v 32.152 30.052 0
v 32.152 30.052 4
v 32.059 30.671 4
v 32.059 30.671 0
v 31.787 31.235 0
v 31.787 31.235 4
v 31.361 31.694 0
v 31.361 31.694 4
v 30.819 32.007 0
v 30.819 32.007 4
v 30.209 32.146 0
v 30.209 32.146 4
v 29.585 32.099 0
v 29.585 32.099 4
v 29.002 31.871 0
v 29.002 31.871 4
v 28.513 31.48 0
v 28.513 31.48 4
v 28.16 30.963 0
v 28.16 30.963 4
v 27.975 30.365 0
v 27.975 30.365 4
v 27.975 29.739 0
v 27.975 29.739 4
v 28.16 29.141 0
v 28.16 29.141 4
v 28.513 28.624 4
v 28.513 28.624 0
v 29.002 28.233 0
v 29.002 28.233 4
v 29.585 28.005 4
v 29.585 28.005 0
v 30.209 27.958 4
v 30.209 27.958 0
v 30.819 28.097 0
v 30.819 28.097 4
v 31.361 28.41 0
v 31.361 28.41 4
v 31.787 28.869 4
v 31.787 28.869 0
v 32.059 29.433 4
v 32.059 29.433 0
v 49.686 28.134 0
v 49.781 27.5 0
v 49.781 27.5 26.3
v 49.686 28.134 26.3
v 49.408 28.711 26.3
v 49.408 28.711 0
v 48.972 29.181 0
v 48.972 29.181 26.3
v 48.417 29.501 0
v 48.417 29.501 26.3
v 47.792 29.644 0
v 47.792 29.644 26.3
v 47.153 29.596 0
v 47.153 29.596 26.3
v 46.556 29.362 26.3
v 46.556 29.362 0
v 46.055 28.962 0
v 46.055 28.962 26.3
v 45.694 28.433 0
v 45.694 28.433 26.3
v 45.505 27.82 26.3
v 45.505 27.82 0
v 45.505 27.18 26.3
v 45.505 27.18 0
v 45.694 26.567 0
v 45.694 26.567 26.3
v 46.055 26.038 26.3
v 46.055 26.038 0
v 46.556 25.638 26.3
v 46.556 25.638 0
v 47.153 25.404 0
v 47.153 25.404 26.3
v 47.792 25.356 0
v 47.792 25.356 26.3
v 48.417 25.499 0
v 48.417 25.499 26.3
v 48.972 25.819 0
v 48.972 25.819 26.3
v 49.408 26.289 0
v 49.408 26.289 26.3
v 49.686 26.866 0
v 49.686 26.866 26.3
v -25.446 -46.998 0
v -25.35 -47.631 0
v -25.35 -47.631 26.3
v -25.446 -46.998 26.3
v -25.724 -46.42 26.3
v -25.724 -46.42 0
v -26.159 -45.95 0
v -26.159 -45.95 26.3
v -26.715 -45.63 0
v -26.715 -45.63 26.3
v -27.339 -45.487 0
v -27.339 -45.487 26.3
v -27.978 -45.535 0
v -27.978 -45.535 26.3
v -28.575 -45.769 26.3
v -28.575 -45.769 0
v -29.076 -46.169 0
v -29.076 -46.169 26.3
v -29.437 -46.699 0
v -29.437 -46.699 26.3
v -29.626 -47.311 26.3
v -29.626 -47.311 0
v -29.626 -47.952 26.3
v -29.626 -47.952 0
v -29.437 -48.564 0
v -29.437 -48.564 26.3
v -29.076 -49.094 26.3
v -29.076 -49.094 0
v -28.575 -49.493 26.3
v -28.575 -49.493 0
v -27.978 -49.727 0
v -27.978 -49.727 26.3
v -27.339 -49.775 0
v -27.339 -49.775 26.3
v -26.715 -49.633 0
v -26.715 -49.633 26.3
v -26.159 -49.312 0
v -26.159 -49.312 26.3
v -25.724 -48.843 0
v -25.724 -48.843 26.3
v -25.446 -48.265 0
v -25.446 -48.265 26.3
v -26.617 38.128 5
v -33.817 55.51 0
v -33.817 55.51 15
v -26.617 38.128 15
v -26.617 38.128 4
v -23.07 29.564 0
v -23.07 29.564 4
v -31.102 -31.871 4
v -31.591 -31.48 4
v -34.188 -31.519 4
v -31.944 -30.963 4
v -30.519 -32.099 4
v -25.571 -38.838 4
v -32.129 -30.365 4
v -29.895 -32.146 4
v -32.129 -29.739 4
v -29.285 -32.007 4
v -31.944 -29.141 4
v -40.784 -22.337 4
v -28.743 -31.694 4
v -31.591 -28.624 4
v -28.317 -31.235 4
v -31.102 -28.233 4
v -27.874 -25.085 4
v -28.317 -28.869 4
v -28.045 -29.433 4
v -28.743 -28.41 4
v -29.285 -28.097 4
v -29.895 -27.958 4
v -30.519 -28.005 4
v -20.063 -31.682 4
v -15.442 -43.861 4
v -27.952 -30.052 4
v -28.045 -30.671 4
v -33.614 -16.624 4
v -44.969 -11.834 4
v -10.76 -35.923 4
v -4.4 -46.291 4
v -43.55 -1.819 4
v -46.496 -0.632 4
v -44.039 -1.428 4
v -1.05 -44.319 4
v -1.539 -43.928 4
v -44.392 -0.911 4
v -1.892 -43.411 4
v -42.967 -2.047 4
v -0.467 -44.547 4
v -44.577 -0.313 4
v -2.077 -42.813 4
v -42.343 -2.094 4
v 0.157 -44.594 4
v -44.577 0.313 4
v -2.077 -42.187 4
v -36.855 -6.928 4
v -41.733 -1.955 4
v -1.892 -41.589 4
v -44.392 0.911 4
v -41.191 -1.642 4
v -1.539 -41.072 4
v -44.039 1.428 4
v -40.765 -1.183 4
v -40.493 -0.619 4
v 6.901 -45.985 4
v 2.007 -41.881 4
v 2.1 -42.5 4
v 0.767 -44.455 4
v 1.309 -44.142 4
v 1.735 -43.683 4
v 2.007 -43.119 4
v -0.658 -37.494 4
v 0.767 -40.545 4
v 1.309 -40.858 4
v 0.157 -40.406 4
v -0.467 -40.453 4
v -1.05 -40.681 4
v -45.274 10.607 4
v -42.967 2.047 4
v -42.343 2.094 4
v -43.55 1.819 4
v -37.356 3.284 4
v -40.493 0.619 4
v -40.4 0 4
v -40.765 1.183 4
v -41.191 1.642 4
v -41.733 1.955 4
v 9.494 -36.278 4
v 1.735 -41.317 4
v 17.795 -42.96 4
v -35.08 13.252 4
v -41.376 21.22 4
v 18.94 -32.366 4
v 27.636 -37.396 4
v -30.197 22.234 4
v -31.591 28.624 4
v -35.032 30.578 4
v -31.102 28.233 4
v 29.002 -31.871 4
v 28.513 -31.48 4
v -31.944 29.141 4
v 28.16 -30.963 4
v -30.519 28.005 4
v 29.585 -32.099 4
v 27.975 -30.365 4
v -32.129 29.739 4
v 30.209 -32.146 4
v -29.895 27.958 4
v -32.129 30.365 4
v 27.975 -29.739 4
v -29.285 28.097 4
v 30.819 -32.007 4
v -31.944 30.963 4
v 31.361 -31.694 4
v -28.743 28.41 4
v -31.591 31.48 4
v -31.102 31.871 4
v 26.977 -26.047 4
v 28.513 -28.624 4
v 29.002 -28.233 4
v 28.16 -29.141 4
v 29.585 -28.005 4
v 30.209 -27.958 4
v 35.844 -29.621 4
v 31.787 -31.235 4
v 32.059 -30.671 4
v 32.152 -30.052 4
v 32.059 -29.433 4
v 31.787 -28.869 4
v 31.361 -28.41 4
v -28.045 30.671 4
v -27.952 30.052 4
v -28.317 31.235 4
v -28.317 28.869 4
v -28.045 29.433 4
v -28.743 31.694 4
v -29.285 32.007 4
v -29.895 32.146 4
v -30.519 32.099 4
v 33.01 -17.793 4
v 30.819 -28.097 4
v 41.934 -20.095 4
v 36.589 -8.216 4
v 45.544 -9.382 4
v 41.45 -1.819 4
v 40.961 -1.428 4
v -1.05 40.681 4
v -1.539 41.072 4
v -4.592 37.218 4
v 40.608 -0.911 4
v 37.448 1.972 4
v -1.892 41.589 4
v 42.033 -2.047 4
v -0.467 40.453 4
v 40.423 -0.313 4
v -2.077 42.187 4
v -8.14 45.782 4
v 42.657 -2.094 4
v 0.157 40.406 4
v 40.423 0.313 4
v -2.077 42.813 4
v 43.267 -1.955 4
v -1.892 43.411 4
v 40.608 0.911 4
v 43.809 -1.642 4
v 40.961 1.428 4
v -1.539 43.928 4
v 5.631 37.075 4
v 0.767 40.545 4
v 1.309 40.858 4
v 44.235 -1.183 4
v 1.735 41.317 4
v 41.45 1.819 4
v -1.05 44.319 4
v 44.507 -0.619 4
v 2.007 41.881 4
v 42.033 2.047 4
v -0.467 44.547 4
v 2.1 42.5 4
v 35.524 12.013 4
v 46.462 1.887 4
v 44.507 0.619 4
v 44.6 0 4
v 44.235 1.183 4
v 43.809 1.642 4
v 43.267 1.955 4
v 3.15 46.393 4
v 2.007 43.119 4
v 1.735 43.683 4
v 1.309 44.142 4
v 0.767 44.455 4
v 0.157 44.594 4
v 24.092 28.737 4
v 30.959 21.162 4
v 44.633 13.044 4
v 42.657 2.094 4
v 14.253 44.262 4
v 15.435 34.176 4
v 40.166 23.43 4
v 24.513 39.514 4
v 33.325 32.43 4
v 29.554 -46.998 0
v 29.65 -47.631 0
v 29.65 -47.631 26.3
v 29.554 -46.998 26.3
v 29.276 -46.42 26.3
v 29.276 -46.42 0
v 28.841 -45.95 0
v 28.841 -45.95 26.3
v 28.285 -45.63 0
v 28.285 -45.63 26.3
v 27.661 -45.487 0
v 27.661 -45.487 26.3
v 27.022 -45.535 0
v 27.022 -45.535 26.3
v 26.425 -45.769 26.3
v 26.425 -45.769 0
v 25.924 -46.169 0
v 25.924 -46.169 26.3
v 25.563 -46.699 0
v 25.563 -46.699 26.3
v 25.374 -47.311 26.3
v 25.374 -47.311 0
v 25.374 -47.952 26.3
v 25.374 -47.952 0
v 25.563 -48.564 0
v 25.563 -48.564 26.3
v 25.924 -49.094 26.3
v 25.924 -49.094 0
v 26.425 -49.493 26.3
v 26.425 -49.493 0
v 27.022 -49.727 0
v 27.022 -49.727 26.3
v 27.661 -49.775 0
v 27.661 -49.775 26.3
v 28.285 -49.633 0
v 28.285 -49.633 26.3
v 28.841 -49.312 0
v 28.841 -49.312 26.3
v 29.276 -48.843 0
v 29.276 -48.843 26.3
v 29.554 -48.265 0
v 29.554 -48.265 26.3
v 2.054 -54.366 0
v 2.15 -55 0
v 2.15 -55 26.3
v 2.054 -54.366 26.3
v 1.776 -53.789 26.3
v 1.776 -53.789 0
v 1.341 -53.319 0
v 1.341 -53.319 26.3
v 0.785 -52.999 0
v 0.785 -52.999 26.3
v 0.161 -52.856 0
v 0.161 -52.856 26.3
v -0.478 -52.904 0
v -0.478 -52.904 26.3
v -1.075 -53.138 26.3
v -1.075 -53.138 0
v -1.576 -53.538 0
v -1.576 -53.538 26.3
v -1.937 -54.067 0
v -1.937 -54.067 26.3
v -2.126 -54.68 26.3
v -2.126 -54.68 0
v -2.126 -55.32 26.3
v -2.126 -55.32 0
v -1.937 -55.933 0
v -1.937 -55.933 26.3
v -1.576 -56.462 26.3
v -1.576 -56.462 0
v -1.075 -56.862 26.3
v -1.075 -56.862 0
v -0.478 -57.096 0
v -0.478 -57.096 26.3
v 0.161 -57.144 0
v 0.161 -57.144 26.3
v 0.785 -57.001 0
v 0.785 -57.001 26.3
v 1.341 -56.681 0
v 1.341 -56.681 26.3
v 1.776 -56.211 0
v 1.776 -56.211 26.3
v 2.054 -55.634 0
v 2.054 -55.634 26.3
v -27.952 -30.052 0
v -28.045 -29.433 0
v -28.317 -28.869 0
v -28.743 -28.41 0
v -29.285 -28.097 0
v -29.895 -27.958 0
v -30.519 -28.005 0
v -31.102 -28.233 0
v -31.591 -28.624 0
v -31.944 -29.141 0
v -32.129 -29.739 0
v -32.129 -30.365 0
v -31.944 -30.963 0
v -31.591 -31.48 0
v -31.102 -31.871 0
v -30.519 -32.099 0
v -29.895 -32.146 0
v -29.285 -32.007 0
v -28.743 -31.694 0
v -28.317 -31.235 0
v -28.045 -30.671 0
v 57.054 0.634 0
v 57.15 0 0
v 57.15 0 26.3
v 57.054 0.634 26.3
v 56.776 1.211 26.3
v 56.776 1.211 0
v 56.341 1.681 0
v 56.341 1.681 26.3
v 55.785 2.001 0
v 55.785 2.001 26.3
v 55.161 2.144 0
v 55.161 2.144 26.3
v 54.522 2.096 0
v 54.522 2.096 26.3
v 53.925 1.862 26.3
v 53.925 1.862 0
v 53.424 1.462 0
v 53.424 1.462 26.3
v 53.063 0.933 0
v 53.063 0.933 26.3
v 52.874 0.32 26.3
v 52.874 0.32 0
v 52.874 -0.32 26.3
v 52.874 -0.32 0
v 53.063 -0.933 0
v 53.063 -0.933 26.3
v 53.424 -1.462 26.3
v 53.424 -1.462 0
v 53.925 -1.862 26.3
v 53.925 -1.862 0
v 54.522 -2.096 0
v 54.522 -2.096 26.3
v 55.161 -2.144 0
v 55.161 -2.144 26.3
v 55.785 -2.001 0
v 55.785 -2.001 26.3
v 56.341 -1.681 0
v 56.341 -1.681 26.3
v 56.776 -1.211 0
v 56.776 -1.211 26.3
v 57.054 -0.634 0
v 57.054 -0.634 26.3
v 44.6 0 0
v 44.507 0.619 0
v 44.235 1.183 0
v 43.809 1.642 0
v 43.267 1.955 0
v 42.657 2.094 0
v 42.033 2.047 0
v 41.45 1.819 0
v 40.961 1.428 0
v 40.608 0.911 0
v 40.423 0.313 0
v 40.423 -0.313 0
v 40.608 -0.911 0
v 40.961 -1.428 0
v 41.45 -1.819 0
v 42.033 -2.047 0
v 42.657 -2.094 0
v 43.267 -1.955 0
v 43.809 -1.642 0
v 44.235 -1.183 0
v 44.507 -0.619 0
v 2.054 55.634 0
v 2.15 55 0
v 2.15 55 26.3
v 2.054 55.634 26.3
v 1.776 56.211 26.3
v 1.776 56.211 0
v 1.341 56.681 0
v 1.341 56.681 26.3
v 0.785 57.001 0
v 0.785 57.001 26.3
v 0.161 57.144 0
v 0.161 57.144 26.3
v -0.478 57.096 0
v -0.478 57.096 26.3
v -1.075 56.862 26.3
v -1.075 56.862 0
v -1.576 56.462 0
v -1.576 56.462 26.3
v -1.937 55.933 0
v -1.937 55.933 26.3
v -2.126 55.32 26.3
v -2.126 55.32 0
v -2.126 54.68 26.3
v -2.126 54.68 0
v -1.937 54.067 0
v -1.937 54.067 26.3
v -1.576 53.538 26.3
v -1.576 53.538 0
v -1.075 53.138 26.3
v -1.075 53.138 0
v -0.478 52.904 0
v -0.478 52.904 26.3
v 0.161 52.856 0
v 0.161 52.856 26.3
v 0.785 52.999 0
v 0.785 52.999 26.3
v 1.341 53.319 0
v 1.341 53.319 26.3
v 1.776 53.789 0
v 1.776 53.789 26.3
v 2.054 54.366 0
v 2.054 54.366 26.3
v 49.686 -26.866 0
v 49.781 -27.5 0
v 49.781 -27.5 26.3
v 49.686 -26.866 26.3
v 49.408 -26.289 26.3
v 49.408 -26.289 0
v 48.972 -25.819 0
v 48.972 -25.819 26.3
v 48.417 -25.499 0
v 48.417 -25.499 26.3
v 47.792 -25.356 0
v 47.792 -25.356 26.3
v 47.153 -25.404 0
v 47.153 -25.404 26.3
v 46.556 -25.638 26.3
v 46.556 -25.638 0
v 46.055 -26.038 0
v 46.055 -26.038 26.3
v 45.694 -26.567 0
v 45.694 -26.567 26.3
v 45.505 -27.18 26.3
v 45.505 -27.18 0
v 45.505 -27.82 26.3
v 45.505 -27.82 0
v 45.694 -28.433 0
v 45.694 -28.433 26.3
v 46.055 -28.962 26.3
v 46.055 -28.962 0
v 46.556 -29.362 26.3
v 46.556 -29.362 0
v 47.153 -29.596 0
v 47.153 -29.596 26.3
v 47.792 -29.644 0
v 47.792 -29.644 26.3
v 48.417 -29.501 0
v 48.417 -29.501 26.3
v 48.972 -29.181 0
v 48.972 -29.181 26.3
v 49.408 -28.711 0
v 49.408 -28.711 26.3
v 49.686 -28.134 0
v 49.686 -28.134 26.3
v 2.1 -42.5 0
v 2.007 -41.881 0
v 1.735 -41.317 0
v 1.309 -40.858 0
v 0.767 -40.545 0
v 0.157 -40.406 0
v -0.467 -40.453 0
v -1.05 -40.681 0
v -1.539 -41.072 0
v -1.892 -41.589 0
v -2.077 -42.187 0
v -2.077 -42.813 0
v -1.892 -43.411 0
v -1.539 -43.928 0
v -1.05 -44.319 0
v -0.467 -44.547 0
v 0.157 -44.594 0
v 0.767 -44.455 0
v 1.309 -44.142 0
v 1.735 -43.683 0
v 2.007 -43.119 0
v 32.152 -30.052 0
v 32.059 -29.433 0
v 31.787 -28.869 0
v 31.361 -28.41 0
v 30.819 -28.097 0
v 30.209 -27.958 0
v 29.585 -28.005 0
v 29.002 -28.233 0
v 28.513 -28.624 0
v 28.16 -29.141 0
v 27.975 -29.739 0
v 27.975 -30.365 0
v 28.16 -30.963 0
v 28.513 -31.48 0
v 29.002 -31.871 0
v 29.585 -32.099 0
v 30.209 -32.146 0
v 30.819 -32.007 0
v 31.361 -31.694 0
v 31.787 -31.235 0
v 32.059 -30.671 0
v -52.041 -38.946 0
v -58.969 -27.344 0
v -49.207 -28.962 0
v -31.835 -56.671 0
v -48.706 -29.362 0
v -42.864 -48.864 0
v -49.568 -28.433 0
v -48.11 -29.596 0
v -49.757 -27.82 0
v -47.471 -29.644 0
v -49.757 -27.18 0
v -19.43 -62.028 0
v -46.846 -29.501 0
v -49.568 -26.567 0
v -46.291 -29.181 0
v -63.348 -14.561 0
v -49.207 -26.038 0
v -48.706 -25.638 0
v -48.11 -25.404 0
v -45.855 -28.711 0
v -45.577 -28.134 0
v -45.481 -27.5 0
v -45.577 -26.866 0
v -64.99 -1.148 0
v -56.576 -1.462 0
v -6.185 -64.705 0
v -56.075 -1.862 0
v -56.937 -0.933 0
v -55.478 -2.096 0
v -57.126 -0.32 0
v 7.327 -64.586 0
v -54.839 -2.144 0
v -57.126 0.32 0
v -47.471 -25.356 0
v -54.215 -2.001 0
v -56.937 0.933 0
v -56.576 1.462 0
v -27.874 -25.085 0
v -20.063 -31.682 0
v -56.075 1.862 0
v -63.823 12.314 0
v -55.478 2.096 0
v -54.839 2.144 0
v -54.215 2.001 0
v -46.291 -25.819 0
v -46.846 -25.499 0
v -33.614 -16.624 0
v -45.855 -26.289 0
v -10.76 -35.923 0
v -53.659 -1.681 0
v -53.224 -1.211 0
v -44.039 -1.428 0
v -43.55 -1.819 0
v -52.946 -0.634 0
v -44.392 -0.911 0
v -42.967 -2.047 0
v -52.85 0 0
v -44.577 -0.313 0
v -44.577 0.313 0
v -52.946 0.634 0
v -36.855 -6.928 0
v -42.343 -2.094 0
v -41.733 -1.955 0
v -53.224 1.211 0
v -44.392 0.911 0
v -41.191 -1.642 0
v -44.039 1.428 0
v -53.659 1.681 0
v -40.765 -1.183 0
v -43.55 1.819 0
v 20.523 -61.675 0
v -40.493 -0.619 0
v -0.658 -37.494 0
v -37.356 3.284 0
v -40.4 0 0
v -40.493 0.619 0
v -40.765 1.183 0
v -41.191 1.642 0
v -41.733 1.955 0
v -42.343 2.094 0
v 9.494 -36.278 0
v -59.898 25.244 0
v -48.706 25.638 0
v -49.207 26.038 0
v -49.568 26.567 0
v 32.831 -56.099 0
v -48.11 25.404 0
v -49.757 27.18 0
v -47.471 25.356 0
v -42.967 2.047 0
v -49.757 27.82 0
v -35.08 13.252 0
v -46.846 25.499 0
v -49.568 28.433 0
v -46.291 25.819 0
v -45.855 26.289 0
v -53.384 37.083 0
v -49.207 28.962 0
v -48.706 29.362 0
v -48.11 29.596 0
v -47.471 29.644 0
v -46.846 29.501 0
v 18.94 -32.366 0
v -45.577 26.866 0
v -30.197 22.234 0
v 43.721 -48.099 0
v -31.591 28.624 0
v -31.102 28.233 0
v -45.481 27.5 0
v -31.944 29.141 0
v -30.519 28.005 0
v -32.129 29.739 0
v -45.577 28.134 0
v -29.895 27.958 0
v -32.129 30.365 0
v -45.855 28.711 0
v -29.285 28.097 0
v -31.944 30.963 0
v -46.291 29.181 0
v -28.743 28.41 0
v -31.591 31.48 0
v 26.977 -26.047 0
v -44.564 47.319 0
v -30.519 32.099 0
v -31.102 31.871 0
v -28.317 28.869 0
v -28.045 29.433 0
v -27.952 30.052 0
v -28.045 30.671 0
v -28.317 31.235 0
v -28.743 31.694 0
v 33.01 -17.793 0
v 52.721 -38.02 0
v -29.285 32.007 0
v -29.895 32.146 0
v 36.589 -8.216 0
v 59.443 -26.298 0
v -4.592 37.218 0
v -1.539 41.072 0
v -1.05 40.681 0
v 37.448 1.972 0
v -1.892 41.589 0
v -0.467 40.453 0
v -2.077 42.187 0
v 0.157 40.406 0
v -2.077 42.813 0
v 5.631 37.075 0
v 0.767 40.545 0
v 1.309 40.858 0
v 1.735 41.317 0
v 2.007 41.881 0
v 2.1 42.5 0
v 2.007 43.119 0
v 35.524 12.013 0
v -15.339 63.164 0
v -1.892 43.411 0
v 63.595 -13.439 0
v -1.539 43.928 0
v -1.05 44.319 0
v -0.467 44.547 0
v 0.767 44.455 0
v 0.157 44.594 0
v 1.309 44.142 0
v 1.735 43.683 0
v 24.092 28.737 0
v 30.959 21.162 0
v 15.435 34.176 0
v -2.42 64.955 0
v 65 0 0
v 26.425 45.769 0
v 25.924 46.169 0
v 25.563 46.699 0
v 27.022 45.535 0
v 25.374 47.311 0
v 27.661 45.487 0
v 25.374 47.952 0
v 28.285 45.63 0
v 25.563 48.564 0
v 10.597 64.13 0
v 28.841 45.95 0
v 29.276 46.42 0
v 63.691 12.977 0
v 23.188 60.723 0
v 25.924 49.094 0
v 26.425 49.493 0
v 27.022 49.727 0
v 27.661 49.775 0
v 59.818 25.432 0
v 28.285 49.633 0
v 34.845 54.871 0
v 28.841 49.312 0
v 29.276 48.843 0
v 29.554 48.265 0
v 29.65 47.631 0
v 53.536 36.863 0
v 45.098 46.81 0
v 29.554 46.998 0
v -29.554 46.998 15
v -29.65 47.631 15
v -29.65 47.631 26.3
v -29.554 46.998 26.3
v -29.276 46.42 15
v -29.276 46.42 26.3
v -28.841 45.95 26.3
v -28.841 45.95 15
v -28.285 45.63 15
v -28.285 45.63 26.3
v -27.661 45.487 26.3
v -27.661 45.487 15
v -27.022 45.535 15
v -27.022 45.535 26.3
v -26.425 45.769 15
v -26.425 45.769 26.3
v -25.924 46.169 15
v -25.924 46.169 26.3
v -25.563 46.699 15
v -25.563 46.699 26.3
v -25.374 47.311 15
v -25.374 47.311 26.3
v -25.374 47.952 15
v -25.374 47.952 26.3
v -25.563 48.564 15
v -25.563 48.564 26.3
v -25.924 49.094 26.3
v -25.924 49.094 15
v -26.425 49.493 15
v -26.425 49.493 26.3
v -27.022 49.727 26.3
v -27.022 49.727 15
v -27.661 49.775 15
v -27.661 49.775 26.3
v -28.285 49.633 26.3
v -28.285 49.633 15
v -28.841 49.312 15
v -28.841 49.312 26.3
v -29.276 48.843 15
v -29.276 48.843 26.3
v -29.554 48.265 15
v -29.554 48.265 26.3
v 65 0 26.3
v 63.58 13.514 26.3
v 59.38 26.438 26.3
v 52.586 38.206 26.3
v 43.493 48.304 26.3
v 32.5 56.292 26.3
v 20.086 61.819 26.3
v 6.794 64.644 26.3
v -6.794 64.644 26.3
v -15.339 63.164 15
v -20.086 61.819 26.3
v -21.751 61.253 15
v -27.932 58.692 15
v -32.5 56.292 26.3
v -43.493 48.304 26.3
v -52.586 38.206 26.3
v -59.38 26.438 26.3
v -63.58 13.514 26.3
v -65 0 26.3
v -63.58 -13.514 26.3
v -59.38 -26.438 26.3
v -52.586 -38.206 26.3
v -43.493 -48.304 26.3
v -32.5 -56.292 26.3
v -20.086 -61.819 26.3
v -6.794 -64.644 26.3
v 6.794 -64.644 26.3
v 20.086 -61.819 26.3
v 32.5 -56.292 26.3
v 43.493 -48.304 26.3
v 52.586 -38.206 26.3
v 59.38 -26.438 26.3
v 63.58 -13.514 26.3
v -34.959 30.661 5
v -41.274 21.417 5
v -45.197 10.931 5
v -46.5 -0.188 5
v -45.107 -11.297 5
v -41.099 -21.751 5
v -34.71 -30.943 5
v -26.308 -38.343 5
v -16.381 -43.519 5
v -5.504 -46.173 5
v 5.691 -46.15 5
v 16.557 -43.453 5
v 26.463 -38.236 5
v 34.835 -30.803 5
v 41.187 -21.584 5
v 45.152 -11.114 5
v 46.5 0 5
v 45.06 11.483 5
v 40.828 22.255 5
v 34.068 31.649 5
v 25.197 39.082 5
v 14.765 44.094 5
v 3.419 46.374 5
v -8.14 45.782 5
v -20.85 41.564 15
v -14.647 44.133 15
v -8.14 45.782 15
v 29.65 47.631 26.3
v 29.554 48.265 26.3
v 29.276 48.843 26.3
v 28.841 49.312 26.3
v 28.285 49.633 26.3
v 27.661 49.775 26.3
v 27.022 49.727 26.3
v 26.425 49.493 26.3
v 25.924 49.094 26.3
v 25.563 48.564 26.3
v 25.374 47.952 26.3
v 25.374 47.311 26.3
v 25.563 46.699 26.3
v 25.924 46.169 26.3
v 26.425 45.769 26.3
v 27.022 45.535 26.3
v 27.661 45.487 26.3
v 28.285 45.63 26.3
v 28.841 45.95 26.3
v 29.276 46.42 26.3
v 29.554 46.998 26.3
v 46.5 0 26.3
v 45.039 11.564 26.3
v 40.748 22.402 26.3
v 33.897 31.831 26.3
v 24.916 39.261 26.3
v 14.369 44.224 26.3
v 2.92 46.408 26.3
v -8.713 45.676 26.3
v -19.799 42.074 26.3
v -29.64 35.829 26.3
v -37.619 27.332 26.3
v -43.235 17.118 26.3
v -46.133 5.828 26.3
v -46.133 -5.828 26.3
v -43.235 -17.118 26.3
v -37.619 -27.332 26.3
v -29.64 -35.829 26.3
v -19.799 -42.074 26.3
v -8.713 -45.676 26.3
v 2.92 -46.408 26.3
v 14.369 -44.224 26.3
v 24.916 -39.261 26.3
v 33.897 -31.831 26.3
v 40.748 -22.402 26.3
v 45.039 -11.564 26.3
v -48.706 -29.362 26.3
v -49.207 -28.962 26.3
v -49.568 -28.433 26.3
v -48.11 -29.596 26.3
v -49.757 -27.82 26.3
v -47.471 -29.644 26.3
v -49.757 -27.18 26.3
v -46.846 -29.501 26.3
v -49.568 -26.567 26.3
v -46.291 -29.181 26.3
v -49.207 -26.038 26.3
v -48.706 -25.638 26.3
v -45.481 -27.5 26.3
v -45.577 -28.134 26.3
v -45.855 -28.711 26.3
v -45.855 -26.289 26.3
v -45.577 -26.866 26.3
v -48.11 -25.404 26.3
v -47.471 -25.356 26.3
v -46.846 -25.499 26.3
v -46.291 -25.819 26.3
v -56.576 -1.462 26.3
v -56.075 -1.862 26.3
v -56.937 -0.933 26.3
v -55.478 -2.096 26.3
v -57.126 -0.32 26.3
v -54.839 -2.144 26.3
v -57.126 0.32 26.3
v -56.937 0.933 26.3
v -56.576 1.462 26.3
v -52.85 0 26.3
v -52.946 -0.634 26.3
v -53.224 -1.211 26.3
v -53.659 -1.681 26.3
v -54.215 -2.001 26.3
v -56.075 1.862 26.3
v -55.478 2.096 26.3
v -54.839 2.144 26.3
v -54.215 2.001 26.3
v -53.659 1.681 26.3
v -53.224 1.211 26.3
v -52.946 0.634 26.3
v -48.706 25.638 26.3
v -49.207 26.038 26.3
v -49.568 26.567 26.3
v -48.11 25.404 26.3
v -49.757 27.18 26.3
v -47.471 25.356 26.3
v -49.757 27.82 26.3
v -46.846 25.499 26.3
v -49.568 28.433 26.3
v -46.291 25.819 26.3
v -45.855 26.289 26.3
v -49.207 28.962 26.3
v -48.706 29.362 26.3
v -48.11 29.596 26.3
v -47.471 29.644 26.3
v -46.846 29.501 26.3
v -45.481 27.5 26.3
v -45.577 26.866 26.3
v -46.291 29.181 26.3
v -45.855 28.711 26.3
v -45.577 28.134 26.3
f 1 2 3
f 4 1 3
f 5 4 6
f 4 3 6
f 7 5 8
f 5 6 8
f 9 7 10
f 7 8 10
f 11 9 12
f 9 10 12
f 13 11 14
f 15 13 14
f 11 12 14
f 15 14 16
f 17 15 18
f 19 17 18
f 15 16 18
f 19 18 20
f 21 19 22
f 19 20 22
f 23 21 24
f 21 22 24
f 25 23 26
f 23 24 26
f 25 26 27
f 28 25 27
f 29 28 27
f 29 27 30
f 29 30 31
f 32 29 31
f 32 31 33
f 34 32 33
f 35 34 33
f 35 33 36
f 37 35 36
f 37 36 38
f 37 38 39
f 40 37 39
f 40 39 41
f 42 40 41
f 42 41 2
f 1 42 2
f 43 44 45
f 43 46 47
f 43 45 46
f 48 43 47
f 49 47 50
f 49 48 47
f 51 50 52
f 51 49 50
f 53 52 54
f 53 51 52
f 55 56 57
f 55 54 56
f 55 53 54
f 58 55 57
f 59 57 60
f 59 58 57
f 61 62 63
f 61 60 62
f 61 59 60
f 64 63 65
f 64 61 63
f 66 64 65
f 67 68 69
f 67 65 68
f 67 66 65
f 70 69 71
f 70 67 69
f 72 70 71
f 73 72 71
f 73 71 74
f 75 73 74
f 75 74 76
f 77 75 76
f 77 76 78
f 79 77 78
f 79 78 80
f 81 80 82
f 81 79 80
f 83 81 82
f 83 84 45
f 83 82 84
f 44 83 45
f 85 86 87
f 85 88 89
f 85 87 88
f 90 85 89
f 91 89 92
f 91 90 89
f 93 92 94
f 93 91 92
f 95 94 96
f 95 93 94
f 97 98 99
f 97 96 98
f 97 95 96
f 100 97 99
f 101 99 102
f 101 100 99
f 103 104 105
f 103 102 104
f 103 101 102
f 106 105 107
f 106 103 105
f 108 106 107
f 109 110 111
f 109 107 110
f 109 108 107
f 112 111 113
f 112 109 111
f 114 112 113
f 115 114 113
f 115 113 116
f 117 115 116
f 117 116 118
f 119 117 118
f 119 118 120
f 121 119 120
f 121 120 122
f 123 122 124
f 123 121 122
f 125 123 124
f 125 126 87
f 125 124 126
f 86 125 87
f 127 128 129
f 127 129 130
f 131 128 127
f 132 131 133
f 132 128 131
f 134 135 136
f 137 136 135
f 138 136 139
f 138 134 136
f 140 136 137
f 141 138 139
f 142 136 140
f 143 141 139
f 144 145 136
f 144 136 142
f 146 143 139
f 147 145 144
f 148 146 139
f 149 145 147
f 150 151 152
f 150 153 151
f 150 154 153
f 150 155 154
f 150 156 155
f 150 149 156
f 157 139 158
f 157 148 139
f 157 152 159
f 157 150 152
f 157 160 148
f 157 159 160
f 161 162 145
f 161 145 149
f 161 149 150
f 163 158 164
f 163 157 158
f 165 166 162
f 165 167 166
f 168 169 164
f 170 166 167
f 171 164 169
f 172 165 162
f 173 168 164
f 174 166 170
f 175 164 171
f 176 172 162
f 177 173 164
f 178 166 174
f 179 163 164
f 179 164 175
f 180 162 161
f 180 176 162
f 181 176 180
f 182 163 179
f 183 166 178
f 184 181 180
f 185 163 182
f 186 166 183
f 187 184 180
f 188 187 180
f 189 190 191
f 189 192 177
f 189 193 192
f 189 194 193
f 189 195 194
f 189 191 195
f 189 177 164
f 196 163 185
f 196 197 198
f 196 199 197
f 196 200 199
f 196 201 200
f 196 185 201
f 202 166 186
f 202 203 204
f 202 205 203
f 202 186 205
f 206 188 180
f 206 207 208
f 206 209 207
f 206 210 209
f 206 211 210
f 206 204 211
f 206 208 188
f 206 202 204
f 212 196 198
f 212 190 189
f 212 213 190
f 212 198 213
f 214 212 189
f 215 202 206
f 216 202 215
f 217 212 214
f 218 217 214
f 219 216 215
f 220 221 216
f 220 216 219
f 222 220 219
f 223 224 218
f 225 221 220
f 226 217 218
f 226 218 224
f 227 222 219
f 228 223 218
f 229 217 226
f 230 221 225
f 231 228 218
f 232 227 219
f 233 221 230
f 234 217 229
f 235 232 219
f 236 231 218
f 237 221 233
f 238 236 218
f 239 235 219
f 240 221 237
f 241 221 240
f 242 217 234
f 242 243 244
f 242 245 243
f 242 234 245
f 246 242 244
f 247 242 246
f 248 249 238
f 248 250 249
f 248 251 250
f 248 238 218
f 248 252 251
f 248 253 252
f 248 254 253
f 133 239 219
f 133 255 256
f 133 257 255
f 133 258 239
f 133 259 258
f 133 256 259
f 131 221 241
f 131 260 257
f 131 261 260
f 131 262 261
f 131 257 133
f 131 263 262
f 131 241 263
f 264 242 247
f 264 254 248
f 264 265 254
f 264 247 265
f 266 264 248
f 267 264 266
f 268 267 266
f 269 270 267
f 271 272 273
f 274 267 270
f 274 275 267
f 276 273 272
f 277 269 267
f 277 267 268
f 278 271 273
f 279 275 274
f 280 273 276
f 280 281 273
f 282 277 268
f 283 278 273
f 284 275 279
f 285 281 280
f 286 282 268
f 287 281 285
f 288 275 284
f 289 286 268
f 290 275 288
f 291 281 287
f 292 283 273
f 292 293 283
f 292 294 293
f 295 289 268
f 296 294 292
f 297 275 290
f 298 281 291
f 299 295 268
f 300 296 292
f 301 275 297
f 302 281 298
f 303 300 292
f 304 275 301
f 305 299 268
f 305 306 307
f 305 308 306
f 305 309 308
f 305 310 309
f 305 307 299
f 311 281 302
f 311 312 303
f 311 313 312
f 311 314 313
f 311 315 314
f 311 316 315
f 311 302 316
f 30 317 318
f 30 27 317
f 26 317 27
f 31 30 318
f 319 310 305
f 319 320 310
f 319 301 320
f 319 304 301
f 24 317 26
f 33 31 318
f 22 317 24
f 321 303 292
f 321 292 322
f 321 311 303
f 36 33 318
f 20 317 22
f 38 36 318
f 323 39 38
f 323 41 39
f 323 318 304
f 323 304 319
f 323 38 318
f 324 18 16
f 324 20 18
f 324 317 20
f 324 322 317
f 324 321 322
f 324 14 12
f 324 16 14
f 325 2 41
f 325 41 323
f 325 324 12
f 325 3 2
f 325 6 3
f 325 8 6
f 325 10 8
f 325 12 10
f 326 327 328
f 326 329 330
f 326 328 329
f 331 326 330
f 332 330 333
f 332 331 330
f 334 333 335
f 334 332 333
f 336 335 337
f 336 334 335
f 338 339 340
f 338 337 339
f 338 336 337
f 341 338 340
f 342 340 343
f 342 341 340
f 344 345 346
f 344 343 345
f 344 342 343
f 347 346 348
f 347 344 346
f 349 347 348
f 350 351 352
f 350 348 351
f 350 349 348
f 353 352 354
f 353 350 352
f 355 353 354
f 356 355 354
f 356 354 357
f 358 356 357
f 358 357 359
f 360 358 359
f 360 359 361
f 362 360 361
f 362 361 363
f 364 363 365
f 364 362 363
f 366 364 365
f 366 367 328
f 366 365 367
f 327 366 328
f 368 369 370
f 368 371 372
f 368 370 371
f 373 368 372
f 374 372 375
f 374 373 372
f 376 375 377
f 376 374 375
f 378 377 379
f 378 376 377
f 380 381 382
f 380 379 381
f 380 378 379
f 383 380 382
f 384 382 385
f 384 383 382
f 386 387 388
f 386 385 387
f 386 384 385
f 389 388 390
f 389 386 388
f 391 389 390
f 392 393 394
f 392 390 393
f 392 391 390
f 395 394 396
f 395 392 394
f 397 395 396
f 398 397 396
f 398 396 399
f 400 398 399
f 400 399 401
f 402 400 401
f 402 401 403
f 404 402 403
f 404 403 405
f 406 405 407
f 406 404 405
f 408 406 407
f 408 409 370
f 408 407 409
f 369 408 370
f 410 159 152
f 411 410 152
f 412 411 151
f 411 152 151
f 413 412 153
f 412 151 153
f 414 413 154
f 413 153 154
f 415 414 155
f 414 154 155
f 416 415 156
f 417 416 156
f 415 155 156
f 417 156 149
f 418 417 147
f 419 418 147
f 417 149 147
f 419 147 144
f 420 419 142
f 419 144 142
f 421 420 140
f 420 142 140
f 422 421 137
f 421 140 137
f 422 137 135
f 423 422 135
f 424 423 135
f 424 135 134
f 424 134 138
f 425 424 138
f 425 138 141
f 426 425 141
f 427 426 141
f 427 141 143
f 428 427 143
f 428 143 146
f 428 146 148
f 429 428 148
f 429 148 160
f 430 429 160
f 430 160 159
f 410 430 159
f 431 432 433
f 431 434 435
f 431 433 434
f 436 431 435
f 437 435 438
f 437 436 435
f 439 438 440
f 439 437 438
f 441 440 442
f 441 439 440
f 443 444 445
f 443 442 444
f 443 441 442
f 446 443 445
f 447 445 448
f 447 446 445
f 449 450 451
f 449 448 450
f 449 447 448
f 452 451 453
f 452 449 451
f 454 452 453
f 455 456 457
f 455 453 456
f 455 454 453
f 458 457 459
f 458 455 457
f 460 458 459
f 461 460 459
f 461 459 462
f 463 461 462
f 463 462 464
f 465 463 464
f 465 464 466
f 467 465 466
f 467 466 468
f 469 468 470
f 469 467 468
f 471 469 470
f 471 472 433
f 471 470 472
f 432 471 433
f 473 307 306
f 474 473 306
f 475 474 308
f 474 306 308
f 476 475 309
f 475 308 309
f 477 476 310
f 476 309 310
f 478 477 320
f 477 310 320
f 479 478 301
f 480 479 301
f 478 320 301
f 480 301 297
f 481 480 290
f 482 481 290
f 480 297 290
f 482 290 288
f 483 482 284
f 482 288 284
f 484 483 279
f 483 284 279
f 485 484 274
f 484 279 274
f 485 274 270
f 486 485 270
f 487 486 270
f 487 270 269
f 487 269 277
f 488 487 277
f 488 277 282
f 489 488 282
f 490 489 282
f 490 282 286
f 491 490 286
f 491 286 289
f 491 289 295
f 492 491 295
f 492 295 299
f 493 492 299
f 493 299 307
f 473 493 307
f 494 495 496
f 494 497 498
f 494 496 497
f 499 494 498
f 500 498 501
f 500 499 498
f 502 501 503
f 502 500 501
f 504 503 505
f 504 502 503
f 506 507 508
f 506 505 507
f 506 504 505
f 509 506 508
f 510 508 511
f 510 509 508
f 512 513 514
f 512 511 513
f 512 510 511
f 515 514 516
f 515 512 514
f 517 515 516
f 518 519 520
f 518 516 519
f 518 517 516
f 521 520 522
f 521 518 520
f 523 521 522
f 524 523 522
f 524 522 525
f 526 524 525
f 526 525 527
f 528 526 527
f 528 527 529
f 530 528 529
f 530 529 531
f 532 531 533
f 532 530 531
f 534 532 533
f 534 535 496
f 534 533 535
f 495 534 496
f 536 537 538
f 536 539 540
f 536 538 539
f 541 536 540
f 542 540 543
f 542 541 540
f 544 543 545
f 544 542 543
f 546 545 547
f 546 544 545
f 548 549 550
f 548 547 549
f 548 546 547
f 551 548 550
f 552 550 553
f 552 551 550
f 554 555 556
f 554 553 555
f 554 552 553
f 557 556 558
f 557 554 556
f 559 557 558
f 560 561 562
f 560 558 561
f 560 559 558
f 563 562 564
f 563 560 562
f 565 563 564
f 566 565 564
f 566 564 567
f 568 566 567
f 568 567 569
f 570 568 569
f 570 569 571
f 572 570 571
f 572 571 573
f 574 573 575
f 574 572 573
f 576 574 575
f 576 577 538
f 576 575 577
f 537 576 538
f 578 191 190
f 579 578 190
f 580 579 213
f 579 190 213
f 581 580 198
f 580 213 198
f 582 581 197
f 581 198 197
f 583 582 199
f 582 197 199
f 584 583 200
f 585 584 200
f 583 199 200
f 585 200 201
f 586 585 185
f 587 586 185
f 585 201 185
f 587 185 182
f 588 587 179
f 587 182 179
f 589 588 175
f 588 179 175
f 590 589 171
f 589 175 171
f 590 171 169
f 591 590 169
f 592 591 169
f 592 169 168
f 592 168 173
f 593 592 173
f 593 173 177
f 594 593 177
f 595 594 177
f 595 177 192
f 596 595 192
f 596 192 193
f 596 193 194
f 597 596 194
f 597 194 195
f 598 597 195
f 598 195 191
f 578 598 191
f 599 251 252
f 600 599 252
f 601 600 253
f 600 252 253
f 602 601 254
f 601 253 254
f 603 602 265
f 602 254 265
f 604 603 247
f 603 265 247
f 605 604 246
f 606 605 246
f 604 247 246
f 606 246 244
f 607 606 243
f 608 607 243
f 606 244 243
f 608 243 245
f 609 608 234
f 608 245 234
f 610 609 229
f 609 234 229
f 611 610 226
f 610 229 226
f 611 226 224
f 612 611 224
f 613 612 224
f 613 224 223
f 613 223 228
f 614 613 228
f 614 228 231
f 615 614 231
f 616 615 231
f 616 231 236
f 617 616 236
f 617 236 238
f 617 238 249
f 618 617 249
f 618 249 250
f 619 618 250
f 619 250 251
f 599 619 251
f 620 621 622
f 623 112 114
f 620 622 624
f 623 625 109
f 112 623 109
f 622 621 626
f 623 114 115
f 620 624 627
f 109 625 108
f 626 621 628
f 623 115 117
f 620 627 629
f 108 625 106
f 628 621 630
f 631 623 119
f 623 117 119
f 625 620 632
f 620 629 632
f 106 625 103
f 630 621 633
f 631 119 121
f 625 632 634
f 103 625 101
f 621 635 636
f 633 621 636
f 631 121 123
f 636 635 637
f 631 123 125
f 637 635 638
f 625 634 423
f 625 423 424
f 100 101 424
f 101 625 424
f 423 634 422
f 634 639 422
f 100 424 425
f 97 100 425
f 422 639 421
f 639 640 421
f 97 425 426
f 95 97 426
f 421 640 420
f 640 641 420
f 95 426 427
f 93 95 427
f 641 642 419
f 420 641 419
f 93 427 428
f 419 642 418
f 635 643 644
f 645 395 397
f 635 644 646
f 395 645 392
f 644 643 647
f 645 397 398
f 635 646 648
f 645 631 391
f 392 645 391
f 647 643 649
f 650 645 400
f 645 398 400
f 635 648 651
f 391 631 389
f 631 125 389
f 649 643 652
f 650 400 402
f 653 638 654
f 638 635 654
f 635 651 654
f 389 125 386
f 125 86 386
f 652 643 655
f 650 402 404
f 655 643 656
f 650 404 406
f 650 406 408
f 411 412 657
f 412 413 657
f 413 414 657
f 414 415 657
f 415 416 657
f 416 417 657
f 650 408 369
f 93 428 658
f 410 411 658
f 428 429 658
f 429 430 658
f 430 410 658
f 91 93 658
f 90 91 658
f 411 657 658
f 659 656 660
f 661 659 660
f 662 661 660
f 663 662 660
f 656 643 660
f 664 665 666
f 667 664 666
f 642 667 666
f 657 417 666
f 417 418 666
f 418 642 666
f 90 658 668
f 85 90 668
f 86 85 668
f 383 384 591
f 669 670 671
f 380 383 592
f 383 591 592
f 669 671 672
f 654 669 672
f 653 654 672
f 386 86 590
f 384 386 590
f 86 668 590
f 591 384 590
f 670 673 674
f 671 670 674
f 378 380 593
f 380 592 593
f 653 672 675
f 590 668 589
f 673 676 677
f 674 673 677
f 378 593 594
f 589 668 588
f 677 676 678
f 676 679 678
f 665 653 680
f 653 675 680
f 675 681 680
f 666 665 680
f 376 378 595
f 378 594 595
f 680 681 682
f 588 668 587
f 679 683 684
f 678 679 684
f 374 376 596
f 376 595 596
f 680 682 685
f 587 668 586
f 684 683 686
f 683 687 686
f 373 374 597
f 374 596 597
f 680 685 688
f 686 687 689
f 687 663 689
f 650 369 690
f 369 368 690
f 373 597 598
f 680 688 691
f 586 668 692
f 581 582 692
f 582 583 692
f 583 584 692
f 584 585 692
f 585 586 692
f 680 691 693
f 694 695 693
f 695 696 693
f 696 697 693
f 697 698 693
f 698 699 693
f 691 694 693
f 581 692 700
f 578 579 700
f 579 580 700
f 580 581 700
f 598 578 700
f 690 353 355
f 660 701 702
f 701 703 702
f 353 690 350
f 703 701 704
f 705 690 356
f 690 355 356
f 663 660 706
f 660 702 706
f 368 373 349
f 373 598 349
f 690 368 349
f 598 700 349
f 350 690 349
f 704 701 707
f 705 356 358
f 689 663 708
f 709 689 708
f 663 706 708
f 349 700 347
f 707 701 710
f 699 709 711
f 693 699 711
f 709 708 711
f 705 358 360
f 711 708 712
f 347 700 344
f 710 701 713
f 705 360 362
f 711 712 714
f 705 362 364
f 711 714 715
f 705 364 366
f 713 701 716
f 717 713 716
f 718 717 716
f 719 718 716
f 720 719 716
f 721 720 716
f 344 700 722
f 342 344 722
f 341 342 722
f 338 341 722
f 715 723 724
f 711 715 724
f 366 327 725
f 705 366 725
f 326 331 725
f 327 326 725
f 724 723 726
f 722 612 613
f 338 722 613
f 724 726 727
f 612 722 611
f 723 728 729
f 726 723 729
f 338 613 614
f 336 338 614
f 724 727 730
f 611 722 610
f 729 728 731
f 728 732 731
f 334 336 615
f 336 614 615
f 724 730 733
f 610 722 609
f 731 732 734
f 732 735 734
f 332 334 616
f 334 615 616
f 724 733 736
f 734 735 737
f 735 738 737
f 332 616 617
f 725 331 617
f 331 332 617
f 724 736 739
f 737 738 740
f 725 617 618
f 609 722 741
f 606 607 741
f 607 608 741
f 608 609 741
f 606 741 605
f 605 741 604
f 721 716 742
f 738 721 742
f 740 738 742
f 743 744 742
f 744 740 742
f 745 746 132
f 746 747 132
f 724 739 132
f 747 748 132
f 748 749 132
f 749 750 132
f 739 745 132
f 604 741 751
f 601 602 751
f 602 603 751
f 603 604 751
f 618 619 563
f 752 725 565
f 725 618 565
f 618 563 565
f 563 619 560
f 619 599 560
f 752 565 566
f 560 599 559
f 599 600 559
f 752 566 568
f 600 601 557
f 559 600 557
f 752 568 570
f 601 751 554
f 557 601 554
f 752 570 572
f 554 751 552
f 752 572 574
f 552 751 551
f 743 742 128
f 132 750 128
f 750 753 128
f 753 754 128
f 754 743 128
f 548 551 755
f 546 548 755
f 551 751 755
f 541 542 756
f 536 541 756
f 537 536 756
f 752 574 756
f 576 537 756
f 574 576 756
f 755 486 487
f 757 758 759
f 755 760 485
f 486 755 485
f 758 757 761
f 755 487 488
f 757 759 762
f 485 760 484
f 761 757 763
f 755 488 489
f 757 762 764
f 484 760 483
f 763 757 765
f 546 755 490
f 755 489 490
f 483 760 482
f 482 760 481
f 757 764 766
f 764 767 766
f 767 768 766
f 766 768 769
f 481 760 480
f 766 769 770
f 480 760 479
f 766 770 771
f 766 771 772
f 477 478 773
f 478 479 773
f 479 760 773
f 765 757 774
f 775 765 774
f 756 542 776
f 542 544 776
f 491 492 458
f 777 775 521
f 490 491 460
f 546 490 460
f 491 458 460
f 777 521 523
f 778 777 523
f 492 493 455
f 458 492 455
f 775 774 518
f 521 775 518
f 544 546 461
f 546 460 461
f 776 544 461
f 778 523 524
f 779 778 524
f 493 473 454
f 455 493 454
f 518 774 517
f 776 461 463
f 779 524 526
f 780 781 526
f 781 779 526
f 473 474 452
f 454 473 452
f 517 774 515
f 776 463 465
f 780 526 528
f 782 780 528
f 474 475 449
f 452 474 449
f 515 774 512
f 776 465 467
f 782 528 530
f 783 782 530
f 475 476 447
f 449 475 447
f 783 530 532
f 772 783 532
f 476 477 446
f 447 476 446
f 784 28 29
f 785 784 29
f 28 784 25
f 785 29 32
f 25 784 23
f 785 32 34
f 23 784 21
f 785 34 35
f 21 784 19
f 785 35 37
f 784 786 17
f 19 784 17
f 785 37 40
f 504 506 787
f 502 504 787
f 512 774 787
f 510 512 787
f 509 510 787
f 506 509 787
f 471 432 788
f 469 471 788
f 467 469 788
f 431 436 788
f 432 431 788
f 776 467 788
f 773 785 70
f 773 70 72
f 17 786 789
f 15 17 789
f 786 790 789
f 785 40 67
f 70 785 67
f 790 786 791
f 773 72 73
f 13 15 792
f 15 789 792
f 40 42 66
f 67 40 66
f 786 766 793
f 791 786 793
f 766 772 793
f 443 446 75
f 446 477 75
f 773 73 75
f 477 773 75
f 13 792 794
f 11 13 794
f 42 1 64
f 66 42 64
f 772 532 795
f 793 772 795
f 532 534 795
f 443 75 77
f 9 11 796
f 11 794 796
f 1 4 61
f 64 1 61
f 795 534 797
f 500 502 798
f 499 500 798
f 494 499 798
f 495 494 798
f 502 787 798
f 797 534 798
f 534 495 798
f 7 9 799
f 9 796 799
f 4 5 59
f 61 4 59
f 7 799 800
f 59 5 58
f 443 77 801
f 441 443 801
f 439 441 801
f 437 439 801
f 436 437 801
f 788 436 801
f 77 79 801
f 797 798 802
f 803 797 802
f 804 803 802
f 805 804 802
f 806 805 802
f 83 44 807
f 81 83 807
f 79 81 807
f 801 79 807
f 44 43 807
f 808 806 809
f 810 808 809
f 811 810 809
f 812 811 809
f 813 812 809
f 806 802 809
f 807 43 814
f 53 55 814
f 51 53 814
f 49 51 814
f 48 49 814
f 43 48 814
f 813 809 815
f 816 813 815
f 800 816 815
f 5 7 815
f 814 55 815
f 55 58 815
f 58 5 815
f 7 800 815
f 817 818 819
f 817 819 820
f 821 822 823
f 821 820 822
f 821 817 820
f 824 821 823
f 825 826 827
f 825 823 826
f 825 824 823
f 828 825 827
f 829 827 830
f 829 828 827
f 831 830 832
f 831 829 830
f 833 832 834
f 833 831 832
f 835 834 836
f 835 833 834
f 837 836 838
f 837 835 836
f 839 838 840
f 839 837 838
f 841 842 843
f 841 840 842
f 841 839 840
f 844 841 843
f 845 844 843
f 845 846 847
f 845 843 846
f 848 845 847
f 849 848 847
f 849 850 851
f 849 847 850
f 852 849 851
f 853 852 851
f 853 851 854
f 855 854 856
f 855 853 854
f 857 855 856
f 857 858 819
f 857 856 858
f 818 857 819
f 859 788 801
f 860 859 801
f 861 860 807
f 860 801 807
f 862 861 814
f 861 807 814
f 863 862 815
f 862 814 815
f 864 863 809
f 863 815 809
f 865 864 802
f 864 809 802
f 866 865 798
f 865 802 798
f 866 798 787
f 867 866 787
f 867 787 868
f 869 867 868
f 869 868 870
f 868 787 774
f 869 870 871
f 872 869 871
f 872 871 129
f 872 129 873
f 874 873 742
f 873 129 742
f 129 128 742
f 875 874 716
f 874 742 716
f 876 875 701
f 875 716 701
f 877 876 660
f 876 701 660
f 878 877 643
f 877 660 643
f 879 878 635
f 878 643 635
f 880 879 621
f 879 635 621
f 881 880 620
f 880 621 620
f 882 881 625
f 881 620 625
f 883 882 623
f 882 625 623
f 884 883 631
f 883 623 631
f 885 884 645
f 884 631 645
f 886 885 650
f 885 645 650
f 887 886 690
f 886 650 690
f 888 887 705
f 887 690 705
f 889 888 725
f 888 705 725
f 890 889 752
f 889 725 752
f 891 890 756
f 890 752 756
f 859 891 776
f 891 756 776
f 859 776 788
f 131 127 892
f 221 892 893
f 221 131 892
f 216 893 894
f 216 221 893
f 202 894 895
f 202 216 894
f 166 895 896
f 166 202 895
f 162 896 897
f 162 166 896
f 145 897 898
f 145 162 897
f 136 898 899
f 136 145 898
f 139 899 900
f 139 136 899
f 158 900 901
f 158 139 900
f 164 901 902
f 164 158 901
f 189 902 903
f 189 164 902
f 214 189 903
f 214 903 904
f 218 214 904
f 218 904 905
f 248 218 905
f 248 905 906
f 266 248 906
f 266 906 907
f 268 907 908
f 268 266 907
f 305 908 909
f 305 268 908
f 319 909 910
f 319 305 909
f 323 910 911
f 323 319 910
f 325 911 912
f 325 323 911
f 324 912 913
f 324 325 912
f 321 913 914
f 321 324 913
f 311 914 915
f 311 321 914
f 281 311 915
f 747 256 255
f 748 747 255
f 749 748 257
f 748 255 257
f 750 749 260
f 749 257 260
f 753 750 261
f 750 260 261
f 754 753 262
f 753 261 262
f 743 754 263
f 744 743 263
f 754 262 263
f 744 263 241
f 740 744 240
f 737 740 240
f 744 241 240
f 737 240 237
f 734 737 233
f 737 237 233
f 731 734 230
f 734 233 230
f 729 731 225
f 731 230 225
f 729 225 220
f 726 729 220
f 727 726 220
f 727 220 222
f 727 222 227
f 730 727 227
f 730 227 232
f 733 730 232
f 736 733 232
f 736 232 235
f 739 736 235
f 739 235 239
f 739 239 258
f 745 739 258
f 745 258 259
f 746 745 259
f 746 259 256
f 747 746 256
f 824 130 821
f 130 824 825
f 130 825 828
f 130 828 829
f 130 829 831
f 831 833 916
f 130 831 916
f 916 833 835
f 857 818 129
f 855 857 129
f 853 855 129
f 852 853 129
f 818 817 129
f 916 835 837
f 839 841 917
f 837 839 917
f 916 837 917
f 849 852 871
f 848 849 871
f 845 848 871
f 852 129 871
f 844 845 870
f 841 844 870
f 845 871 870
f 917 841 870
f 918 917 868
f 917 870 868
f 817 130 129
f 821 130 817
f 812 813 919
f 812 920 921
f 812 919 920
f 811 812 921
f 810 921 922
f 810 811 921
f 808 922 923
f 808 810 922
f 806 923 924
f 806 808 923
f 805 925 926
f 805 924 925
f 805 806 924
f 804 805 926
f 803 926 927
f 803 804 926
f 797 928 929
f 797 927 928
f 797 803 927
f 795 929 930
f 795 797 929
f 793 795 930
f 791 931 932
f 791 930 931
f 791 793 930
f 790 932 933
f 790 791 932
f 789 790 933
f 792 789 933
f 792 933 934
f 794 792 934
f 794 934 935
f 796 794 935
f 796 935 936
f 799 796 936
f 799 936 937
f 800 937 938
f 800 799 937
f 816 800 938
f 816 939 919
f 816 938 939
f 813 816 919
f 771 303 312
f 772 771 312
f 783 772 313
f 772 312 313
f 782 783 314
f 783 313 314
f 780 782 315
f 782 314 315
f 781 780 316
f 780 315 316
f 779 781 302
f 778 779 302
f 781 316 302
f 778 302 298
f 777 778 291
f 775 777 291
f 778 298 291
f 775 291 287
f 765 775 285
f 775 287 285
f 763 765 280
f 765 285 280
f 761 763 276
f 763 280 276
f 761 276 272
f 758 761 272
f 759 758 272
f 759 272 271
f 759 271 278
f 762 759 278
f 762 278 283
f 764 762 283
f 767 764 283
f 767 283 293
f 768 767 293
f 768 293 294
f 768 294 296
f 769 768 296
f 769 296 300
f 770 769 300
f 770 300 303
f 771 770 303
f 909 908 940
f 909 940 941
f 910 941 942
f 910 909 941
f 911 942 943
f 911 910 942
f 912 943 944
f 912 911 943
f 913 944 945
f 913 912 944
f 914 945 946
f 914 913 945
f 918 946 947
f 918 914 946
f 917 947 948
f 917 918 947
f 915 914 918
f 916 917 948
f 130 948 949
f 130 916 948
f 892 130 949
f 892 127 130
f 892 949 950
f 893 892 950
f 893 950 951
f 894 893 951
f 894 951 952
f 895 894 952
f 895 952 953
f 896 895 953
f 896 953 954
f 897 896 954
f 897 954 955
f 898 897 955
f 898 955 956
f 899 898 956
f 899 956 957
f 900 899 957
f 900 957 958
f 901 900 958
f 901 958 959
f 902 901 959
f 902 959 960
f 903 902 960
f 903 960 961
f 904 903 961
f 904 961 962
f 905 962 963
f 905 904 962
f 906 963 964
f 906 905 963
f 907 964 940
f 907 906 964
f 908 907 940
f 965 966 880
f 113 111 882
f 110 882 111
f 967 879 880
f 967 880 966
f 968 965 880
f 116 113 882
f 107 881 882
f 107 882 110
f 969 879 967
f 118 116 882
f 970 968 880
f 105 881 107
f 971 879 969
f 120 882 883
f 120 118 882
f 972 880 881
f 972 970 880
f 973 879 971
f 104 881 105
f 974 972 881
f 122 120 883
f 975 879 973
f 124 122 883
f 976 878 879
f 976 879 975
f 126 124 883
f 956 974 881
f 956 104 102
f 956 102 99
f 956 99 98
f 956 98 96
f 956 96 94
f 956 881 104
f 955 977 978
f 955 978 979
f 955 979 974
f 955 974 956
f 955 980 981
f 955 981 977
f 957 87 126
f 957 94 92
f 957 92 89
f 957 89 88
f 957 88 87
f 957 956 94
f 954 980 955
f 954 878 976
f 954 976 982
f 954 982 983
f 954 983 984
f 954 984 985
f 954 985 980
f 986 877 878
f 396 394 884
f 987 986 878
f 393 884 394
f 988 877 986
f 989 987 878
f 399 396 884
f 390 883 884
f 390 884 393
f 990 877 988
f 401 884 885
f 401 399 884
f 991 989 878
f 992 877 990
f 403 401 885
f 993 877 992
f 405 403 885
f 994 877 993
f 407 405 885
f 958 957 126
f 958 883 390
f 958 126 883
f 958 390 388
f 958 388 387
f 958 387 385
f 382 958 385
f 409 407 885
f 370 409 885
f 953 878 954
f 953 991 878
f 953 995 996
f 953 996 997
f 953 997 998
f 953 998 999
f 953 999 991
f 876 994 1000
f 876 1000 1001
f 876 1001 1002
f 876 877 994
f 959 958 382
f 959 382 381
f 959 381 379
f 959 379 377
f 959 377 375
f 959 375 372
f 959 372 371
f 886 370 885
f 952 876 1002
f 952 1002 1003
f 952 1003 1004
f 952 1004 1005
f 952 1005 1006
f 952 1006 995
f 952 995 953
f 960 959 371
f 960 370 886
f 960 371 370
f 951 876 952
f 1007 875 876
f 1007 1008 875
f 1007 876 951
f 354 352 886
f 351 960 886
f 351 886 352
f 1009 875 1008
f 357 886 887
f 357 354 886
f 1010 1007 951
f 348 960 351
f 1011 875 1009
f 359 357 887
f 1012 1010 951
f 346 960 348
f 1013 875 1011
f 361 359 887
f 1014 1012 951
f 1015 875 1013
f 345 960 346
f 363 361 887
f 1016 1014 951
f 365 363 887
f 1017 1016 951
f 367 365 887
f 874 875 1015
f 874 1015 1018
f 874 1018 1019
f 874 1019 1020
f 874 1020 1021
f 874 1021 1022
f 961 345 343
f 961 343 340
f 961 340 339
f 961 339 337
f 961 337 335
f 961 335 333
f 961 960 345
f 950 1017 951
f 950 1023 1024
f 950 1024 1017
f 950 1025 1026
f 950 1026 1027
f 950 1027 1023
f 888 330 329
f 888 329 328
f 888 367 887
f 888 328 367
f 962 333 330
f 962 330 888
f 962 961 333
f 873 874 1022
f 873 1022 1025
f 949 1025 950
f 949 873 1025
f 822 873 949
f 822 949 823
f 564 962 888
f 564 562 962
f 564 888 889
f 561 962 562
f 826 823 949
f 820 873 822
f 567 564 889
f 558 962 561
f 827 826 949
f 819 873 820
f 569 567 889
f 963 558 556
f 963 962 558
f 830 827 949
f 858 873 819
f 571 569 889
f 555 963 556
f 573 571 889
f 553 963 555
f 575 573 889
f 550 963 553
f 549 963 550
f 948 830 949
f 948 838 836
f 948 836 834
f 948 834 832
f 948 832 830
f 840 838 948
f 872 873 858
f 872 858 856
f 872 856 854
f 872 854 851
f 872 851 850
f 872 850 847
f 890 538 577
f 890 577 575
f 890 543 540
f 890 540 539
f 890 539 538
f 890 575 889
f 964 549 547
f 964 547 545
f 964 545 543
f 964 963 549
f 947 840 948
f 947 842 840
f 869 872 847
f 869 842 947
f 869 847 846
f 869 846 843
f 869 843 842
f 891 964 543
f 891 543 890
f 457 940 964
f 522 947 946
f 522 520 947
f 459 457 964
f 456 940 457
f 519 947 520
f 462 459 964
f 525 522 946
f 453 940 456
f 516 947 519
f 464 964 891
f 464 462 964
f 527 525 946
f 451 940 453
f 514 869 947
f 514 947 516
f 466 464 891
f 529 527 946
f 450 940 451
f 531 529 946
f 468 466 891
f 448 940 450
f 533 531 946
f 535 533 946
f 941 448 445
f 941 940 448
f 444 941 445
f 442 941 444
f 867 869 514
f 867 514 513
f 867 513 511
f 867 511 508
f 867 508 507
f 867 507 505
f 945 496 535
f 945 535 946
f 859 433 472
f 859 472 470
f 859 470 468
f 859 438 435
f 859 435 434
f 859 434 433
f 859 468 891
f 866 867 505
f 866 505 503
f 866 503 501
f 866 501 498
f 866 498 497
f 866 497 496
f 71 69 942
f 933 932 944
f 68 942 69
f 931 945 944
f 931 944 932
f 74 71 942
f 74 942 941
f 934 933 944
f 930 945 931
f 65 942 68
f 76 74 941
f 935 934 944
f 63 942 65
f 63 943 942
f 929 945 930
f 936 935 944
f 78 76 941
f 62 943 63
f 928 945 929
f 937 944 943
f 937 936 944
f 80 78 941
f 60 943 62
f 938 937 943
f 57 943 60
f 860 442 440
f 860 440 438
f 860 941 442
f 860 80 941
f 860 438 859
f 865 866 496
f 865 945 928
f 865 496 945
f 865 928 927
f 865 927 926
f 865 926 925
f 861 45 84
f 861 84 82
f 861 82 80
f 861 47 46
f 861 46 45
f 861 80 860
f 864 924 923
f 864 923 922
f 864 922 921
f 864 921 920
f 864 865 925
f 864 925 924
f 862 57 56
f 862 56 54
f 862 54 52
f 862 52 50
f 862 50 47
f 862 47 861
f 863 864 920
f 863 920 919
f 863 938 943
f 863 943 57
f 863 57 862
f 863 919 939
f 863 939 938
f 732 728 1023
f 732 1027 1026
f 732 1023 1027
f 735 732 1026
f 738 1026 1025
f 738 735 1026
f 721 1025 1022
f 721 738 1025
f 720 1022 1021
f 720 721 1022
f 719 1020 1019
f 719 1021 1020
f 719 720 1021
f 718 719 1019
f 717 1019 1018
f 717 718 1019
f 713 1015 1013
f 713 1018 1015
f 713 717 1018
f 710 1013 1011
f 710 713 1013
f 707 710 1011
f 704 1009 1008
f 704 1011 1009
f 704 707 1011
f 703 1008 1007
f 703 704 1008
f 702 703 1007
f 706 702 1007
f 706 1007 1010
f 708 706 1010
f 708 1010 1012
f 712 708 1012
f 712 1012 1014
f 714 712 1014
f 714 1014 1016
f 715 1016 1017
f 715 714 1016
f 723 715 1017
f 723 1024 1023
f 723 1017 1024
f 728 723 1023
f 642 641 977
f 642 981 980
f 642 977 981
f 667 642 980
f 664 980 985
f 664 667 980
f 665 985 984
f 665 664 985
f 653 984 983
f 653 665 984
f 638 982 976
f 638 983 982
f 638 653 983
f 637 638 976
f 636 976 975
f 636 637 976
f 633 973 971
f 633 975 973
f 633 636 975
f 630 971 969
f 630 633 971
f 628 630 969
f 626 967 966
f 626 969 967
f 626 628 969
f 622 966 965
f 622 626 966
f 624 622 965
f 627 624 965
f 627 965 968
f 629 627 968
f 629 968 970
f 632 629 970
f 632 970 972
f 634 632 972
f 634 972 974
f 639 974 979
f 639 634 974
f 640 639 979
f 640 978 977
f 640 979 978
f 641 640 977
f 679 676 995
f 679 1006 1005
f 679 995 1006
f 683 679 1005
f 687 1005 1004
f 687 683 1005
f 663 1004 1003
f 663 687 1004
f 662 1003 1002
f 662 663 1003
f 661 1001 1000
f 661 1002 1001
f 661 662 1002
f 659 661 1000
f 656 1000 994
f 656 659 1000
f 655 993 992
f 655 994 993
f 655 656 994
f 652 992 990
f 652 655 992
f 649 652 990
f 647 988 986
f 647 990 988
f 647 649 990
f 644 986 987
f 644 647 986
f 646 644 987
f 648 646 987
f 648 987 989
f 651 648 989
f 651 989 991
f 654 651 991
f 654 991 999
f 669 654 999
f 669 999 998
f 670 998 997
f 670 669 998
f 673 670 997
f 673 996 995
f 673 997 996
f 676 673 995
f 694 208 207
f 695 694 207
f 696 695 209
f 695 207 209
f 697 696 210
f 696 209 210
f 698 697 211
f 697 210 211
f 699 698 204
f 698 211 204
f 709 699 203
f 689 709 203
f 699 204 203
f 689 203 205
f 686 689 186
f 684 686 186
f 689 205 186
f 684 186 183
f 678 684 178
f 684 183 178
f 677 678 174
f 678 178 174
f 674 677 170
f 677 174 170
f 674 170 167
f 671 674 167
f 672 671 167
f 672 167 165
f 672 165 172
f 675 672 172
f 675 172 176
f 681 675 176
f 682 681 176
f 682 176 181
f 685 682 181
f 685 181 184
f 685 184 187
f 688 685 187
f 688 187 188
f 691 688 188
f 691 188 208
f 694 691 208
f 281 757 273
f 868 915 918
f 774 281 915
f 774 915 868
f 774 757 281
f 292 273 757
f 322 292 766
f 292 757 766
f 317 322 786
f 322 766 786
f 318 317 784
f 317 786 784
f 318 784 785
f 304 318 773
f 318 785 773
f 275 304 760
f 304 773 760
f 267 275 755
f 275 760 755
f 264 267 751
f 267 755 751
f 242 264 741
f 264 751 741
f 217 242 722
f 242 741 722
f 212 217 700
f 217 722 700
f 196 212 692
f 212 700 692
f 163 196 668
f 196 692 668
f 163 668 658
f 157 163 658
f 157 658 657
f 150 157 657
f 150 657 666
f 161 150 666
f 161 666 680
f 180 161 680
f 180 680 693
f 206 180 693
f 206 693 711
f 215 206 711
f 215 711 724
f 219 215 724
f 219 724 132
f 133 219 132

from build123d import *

# Parameters (mm, degrees)
SKETCH_1_R               = 65
EXTRUDE_1_DEPTH          = 5
SKETCH_2_R               = 65
SKETCH_2_R_2             = 46.5
EXTRUDE_2_DEPTH          = 21.3
SKETCH_3_R               = 2.1
CUT_EXTRUDE_1_DEPTH      = 21.3
SKETCH_4_R               = 37.5
CUT_EXTRUDE_2_DEPTH      = 21.3
CUT_EXTRUDE_3_DEPTH      = 15
CUT_EXTRUDE_4_DEPTH      = 95.359366255
CUT_EXTRUDE_4_DEPTH_BACK = 95.359366255
SKETCH_6_R               = 2.15
CUT_EXTRUDE_START        = -1
CUT_EXTRUDE_5_DEPTH      = 1


with BuildPart() as part:
    # 草图1 → 凸台-拉伸1 (new body)
    with BuildSketch(Plane.XY):
        Circle(SKETCH_1_R)
    extrude(amount=EXTRUDE_1_DEPTH)

    # 草图2 → 凸台-拉伸2 (add)
    with BuildSketch(Plane.XY.offset(5)):
        Circle(SKETCH_2_R)
        Circle(SKETCH_2_R_2, mode=Mode.SUBTRACT)
    extrude(amount=EXTRUDE_2_DEPTH)

    # 草图3 → 切除-拉伸1 (cut)
    with BuildSketch(Plane.XY.offset(5)):
        with Locations((0, 42.5)):
            Circle(SKETCH_3_R)
        with Locations((30.0520382, 30.0520382)):
            Circle(SKETCH_3_R)
        with Locations((42.5, 0)):
            Circle(SKETCH_3_R)
        with Locations((30.0520382, -30.0520382)):
            Circle(SKETCH_3_R)
        with Locations((0, -42.5)):
            Circle(SKETCH_3_R)
        with Locations((-30.0520382, -30.0520382)):
            Circle(SKETCH_3_R)
        with Locations((-42.5, 0)):
            Circle(SKETCH_3_R)
        with Locations((-30.0520382, 30.0520382)):
            Circle(SKETCH_3_R)
    extrude(amount=-CUT_EXTRUDE_1_DEPTH, mode=Mode.SUBTRACT)

    # 草图4 → 切除-拉伸2 (cut)
    with BuildSketch(Plane(origin=(0, 0, 0), x_dir=(-1, 0, 0), z_dir=(0, 0, -1))):
        Circle(SKETCH_4_R)
    extrude(amount=-CUT_EXTRUDE_2_DEPTH, mode=Mode.SUBTRACT)

    # 草图5 → 切除-拉伸3 (cut)
    with BuildSketch(Plane(origin=(0, 0, 0), x_dir=(-1, 0, 0), z_dir=(0, 0, -1))):
        Polygon((34.449558984, 57.03733322), (19.236184468, 20.308998132), (0.758593817, 27.96266678), (15.971968334, 64.691001868), align=None)
    extrude(amount=-CUT_EXTRUDE_3_DEPTH, mode=Mode.SUBTRACT)

    # 草图6 → 切除-拉伸4 (cut, two sides: drawn at the far end of the back side and taken through both)
    with BuildSketch(Plane.XY.offset(5).offset(-CUT_EXTRUDE_4_DEPTH_BACK)):
        with Locations((0, 55)):
            Circle(SKETCH_6_R)
        with Locations((27.5, 47.631397208)):
            Circle(SKETCH_6_R)
        with Locations((47.631397208, 27.5)):
            Circle(SKETCH_6_R)
        with Locations((55, 0)):
            Circle(SKETCH_6_R)
        with Locations((47.631397208, -27.5)):
            Circle(SKETCH_6_R)
        with Locations((27.5, -47.631397208)):
            Circle(SKETCH_6_R)
        with Locations((0, -55)):
            Circle(SKETCH_6_R)
        with Locations((-27.5, -47.631397208)):
            Circle(SKETCH_6_R)
        with Locations((-47.631397208, -27.5)):
            Circle(SKETCH_6_R)
        with Locations((-55, 0)):
            Circle(SKETCH_6_R)
        with Locations((-47.631397208, 27.5)):
            Circle(SKETCH_6_R)
        with Locations(Location((-27.5, 47.631397208, 0), (0, 0, 180))):
            Circle(SKETCH_6_R)
    extrude(amount=CUT_EXTRUDE_4_DEPTH + CUT_EXTRUDE_4_DEPTH_BACK, mode=Mode.SUBTRACT)

    # 草图7 → 切除-拉伸5 (cut)
    with BuildSketch(Plane.XY.offset(5).offset(CUT_EXTRUDE_START)):
        with BuildLine():
            Line((-23.069770834, 29.564094332), (-26.617216434, 38.128385611))
            ThreePointArc((-26.617216434, 38.128385611), (17.794779605, -42.960398262), (-8.139625784, 45.782054258))
            Line((-8.139625784, 45.782054258), (-4.592180184, 37.217762979))
            ThreePointArc((-4.592180184, 37.217762979), (14.350628714, -34.645482469), (-23.069770834, 29.564094332))
        make_face()
    extrude(amount=CUT_EXTRUDE_5_DEPTH, mode=Mode.SUBTRACT)


solid = part.part
